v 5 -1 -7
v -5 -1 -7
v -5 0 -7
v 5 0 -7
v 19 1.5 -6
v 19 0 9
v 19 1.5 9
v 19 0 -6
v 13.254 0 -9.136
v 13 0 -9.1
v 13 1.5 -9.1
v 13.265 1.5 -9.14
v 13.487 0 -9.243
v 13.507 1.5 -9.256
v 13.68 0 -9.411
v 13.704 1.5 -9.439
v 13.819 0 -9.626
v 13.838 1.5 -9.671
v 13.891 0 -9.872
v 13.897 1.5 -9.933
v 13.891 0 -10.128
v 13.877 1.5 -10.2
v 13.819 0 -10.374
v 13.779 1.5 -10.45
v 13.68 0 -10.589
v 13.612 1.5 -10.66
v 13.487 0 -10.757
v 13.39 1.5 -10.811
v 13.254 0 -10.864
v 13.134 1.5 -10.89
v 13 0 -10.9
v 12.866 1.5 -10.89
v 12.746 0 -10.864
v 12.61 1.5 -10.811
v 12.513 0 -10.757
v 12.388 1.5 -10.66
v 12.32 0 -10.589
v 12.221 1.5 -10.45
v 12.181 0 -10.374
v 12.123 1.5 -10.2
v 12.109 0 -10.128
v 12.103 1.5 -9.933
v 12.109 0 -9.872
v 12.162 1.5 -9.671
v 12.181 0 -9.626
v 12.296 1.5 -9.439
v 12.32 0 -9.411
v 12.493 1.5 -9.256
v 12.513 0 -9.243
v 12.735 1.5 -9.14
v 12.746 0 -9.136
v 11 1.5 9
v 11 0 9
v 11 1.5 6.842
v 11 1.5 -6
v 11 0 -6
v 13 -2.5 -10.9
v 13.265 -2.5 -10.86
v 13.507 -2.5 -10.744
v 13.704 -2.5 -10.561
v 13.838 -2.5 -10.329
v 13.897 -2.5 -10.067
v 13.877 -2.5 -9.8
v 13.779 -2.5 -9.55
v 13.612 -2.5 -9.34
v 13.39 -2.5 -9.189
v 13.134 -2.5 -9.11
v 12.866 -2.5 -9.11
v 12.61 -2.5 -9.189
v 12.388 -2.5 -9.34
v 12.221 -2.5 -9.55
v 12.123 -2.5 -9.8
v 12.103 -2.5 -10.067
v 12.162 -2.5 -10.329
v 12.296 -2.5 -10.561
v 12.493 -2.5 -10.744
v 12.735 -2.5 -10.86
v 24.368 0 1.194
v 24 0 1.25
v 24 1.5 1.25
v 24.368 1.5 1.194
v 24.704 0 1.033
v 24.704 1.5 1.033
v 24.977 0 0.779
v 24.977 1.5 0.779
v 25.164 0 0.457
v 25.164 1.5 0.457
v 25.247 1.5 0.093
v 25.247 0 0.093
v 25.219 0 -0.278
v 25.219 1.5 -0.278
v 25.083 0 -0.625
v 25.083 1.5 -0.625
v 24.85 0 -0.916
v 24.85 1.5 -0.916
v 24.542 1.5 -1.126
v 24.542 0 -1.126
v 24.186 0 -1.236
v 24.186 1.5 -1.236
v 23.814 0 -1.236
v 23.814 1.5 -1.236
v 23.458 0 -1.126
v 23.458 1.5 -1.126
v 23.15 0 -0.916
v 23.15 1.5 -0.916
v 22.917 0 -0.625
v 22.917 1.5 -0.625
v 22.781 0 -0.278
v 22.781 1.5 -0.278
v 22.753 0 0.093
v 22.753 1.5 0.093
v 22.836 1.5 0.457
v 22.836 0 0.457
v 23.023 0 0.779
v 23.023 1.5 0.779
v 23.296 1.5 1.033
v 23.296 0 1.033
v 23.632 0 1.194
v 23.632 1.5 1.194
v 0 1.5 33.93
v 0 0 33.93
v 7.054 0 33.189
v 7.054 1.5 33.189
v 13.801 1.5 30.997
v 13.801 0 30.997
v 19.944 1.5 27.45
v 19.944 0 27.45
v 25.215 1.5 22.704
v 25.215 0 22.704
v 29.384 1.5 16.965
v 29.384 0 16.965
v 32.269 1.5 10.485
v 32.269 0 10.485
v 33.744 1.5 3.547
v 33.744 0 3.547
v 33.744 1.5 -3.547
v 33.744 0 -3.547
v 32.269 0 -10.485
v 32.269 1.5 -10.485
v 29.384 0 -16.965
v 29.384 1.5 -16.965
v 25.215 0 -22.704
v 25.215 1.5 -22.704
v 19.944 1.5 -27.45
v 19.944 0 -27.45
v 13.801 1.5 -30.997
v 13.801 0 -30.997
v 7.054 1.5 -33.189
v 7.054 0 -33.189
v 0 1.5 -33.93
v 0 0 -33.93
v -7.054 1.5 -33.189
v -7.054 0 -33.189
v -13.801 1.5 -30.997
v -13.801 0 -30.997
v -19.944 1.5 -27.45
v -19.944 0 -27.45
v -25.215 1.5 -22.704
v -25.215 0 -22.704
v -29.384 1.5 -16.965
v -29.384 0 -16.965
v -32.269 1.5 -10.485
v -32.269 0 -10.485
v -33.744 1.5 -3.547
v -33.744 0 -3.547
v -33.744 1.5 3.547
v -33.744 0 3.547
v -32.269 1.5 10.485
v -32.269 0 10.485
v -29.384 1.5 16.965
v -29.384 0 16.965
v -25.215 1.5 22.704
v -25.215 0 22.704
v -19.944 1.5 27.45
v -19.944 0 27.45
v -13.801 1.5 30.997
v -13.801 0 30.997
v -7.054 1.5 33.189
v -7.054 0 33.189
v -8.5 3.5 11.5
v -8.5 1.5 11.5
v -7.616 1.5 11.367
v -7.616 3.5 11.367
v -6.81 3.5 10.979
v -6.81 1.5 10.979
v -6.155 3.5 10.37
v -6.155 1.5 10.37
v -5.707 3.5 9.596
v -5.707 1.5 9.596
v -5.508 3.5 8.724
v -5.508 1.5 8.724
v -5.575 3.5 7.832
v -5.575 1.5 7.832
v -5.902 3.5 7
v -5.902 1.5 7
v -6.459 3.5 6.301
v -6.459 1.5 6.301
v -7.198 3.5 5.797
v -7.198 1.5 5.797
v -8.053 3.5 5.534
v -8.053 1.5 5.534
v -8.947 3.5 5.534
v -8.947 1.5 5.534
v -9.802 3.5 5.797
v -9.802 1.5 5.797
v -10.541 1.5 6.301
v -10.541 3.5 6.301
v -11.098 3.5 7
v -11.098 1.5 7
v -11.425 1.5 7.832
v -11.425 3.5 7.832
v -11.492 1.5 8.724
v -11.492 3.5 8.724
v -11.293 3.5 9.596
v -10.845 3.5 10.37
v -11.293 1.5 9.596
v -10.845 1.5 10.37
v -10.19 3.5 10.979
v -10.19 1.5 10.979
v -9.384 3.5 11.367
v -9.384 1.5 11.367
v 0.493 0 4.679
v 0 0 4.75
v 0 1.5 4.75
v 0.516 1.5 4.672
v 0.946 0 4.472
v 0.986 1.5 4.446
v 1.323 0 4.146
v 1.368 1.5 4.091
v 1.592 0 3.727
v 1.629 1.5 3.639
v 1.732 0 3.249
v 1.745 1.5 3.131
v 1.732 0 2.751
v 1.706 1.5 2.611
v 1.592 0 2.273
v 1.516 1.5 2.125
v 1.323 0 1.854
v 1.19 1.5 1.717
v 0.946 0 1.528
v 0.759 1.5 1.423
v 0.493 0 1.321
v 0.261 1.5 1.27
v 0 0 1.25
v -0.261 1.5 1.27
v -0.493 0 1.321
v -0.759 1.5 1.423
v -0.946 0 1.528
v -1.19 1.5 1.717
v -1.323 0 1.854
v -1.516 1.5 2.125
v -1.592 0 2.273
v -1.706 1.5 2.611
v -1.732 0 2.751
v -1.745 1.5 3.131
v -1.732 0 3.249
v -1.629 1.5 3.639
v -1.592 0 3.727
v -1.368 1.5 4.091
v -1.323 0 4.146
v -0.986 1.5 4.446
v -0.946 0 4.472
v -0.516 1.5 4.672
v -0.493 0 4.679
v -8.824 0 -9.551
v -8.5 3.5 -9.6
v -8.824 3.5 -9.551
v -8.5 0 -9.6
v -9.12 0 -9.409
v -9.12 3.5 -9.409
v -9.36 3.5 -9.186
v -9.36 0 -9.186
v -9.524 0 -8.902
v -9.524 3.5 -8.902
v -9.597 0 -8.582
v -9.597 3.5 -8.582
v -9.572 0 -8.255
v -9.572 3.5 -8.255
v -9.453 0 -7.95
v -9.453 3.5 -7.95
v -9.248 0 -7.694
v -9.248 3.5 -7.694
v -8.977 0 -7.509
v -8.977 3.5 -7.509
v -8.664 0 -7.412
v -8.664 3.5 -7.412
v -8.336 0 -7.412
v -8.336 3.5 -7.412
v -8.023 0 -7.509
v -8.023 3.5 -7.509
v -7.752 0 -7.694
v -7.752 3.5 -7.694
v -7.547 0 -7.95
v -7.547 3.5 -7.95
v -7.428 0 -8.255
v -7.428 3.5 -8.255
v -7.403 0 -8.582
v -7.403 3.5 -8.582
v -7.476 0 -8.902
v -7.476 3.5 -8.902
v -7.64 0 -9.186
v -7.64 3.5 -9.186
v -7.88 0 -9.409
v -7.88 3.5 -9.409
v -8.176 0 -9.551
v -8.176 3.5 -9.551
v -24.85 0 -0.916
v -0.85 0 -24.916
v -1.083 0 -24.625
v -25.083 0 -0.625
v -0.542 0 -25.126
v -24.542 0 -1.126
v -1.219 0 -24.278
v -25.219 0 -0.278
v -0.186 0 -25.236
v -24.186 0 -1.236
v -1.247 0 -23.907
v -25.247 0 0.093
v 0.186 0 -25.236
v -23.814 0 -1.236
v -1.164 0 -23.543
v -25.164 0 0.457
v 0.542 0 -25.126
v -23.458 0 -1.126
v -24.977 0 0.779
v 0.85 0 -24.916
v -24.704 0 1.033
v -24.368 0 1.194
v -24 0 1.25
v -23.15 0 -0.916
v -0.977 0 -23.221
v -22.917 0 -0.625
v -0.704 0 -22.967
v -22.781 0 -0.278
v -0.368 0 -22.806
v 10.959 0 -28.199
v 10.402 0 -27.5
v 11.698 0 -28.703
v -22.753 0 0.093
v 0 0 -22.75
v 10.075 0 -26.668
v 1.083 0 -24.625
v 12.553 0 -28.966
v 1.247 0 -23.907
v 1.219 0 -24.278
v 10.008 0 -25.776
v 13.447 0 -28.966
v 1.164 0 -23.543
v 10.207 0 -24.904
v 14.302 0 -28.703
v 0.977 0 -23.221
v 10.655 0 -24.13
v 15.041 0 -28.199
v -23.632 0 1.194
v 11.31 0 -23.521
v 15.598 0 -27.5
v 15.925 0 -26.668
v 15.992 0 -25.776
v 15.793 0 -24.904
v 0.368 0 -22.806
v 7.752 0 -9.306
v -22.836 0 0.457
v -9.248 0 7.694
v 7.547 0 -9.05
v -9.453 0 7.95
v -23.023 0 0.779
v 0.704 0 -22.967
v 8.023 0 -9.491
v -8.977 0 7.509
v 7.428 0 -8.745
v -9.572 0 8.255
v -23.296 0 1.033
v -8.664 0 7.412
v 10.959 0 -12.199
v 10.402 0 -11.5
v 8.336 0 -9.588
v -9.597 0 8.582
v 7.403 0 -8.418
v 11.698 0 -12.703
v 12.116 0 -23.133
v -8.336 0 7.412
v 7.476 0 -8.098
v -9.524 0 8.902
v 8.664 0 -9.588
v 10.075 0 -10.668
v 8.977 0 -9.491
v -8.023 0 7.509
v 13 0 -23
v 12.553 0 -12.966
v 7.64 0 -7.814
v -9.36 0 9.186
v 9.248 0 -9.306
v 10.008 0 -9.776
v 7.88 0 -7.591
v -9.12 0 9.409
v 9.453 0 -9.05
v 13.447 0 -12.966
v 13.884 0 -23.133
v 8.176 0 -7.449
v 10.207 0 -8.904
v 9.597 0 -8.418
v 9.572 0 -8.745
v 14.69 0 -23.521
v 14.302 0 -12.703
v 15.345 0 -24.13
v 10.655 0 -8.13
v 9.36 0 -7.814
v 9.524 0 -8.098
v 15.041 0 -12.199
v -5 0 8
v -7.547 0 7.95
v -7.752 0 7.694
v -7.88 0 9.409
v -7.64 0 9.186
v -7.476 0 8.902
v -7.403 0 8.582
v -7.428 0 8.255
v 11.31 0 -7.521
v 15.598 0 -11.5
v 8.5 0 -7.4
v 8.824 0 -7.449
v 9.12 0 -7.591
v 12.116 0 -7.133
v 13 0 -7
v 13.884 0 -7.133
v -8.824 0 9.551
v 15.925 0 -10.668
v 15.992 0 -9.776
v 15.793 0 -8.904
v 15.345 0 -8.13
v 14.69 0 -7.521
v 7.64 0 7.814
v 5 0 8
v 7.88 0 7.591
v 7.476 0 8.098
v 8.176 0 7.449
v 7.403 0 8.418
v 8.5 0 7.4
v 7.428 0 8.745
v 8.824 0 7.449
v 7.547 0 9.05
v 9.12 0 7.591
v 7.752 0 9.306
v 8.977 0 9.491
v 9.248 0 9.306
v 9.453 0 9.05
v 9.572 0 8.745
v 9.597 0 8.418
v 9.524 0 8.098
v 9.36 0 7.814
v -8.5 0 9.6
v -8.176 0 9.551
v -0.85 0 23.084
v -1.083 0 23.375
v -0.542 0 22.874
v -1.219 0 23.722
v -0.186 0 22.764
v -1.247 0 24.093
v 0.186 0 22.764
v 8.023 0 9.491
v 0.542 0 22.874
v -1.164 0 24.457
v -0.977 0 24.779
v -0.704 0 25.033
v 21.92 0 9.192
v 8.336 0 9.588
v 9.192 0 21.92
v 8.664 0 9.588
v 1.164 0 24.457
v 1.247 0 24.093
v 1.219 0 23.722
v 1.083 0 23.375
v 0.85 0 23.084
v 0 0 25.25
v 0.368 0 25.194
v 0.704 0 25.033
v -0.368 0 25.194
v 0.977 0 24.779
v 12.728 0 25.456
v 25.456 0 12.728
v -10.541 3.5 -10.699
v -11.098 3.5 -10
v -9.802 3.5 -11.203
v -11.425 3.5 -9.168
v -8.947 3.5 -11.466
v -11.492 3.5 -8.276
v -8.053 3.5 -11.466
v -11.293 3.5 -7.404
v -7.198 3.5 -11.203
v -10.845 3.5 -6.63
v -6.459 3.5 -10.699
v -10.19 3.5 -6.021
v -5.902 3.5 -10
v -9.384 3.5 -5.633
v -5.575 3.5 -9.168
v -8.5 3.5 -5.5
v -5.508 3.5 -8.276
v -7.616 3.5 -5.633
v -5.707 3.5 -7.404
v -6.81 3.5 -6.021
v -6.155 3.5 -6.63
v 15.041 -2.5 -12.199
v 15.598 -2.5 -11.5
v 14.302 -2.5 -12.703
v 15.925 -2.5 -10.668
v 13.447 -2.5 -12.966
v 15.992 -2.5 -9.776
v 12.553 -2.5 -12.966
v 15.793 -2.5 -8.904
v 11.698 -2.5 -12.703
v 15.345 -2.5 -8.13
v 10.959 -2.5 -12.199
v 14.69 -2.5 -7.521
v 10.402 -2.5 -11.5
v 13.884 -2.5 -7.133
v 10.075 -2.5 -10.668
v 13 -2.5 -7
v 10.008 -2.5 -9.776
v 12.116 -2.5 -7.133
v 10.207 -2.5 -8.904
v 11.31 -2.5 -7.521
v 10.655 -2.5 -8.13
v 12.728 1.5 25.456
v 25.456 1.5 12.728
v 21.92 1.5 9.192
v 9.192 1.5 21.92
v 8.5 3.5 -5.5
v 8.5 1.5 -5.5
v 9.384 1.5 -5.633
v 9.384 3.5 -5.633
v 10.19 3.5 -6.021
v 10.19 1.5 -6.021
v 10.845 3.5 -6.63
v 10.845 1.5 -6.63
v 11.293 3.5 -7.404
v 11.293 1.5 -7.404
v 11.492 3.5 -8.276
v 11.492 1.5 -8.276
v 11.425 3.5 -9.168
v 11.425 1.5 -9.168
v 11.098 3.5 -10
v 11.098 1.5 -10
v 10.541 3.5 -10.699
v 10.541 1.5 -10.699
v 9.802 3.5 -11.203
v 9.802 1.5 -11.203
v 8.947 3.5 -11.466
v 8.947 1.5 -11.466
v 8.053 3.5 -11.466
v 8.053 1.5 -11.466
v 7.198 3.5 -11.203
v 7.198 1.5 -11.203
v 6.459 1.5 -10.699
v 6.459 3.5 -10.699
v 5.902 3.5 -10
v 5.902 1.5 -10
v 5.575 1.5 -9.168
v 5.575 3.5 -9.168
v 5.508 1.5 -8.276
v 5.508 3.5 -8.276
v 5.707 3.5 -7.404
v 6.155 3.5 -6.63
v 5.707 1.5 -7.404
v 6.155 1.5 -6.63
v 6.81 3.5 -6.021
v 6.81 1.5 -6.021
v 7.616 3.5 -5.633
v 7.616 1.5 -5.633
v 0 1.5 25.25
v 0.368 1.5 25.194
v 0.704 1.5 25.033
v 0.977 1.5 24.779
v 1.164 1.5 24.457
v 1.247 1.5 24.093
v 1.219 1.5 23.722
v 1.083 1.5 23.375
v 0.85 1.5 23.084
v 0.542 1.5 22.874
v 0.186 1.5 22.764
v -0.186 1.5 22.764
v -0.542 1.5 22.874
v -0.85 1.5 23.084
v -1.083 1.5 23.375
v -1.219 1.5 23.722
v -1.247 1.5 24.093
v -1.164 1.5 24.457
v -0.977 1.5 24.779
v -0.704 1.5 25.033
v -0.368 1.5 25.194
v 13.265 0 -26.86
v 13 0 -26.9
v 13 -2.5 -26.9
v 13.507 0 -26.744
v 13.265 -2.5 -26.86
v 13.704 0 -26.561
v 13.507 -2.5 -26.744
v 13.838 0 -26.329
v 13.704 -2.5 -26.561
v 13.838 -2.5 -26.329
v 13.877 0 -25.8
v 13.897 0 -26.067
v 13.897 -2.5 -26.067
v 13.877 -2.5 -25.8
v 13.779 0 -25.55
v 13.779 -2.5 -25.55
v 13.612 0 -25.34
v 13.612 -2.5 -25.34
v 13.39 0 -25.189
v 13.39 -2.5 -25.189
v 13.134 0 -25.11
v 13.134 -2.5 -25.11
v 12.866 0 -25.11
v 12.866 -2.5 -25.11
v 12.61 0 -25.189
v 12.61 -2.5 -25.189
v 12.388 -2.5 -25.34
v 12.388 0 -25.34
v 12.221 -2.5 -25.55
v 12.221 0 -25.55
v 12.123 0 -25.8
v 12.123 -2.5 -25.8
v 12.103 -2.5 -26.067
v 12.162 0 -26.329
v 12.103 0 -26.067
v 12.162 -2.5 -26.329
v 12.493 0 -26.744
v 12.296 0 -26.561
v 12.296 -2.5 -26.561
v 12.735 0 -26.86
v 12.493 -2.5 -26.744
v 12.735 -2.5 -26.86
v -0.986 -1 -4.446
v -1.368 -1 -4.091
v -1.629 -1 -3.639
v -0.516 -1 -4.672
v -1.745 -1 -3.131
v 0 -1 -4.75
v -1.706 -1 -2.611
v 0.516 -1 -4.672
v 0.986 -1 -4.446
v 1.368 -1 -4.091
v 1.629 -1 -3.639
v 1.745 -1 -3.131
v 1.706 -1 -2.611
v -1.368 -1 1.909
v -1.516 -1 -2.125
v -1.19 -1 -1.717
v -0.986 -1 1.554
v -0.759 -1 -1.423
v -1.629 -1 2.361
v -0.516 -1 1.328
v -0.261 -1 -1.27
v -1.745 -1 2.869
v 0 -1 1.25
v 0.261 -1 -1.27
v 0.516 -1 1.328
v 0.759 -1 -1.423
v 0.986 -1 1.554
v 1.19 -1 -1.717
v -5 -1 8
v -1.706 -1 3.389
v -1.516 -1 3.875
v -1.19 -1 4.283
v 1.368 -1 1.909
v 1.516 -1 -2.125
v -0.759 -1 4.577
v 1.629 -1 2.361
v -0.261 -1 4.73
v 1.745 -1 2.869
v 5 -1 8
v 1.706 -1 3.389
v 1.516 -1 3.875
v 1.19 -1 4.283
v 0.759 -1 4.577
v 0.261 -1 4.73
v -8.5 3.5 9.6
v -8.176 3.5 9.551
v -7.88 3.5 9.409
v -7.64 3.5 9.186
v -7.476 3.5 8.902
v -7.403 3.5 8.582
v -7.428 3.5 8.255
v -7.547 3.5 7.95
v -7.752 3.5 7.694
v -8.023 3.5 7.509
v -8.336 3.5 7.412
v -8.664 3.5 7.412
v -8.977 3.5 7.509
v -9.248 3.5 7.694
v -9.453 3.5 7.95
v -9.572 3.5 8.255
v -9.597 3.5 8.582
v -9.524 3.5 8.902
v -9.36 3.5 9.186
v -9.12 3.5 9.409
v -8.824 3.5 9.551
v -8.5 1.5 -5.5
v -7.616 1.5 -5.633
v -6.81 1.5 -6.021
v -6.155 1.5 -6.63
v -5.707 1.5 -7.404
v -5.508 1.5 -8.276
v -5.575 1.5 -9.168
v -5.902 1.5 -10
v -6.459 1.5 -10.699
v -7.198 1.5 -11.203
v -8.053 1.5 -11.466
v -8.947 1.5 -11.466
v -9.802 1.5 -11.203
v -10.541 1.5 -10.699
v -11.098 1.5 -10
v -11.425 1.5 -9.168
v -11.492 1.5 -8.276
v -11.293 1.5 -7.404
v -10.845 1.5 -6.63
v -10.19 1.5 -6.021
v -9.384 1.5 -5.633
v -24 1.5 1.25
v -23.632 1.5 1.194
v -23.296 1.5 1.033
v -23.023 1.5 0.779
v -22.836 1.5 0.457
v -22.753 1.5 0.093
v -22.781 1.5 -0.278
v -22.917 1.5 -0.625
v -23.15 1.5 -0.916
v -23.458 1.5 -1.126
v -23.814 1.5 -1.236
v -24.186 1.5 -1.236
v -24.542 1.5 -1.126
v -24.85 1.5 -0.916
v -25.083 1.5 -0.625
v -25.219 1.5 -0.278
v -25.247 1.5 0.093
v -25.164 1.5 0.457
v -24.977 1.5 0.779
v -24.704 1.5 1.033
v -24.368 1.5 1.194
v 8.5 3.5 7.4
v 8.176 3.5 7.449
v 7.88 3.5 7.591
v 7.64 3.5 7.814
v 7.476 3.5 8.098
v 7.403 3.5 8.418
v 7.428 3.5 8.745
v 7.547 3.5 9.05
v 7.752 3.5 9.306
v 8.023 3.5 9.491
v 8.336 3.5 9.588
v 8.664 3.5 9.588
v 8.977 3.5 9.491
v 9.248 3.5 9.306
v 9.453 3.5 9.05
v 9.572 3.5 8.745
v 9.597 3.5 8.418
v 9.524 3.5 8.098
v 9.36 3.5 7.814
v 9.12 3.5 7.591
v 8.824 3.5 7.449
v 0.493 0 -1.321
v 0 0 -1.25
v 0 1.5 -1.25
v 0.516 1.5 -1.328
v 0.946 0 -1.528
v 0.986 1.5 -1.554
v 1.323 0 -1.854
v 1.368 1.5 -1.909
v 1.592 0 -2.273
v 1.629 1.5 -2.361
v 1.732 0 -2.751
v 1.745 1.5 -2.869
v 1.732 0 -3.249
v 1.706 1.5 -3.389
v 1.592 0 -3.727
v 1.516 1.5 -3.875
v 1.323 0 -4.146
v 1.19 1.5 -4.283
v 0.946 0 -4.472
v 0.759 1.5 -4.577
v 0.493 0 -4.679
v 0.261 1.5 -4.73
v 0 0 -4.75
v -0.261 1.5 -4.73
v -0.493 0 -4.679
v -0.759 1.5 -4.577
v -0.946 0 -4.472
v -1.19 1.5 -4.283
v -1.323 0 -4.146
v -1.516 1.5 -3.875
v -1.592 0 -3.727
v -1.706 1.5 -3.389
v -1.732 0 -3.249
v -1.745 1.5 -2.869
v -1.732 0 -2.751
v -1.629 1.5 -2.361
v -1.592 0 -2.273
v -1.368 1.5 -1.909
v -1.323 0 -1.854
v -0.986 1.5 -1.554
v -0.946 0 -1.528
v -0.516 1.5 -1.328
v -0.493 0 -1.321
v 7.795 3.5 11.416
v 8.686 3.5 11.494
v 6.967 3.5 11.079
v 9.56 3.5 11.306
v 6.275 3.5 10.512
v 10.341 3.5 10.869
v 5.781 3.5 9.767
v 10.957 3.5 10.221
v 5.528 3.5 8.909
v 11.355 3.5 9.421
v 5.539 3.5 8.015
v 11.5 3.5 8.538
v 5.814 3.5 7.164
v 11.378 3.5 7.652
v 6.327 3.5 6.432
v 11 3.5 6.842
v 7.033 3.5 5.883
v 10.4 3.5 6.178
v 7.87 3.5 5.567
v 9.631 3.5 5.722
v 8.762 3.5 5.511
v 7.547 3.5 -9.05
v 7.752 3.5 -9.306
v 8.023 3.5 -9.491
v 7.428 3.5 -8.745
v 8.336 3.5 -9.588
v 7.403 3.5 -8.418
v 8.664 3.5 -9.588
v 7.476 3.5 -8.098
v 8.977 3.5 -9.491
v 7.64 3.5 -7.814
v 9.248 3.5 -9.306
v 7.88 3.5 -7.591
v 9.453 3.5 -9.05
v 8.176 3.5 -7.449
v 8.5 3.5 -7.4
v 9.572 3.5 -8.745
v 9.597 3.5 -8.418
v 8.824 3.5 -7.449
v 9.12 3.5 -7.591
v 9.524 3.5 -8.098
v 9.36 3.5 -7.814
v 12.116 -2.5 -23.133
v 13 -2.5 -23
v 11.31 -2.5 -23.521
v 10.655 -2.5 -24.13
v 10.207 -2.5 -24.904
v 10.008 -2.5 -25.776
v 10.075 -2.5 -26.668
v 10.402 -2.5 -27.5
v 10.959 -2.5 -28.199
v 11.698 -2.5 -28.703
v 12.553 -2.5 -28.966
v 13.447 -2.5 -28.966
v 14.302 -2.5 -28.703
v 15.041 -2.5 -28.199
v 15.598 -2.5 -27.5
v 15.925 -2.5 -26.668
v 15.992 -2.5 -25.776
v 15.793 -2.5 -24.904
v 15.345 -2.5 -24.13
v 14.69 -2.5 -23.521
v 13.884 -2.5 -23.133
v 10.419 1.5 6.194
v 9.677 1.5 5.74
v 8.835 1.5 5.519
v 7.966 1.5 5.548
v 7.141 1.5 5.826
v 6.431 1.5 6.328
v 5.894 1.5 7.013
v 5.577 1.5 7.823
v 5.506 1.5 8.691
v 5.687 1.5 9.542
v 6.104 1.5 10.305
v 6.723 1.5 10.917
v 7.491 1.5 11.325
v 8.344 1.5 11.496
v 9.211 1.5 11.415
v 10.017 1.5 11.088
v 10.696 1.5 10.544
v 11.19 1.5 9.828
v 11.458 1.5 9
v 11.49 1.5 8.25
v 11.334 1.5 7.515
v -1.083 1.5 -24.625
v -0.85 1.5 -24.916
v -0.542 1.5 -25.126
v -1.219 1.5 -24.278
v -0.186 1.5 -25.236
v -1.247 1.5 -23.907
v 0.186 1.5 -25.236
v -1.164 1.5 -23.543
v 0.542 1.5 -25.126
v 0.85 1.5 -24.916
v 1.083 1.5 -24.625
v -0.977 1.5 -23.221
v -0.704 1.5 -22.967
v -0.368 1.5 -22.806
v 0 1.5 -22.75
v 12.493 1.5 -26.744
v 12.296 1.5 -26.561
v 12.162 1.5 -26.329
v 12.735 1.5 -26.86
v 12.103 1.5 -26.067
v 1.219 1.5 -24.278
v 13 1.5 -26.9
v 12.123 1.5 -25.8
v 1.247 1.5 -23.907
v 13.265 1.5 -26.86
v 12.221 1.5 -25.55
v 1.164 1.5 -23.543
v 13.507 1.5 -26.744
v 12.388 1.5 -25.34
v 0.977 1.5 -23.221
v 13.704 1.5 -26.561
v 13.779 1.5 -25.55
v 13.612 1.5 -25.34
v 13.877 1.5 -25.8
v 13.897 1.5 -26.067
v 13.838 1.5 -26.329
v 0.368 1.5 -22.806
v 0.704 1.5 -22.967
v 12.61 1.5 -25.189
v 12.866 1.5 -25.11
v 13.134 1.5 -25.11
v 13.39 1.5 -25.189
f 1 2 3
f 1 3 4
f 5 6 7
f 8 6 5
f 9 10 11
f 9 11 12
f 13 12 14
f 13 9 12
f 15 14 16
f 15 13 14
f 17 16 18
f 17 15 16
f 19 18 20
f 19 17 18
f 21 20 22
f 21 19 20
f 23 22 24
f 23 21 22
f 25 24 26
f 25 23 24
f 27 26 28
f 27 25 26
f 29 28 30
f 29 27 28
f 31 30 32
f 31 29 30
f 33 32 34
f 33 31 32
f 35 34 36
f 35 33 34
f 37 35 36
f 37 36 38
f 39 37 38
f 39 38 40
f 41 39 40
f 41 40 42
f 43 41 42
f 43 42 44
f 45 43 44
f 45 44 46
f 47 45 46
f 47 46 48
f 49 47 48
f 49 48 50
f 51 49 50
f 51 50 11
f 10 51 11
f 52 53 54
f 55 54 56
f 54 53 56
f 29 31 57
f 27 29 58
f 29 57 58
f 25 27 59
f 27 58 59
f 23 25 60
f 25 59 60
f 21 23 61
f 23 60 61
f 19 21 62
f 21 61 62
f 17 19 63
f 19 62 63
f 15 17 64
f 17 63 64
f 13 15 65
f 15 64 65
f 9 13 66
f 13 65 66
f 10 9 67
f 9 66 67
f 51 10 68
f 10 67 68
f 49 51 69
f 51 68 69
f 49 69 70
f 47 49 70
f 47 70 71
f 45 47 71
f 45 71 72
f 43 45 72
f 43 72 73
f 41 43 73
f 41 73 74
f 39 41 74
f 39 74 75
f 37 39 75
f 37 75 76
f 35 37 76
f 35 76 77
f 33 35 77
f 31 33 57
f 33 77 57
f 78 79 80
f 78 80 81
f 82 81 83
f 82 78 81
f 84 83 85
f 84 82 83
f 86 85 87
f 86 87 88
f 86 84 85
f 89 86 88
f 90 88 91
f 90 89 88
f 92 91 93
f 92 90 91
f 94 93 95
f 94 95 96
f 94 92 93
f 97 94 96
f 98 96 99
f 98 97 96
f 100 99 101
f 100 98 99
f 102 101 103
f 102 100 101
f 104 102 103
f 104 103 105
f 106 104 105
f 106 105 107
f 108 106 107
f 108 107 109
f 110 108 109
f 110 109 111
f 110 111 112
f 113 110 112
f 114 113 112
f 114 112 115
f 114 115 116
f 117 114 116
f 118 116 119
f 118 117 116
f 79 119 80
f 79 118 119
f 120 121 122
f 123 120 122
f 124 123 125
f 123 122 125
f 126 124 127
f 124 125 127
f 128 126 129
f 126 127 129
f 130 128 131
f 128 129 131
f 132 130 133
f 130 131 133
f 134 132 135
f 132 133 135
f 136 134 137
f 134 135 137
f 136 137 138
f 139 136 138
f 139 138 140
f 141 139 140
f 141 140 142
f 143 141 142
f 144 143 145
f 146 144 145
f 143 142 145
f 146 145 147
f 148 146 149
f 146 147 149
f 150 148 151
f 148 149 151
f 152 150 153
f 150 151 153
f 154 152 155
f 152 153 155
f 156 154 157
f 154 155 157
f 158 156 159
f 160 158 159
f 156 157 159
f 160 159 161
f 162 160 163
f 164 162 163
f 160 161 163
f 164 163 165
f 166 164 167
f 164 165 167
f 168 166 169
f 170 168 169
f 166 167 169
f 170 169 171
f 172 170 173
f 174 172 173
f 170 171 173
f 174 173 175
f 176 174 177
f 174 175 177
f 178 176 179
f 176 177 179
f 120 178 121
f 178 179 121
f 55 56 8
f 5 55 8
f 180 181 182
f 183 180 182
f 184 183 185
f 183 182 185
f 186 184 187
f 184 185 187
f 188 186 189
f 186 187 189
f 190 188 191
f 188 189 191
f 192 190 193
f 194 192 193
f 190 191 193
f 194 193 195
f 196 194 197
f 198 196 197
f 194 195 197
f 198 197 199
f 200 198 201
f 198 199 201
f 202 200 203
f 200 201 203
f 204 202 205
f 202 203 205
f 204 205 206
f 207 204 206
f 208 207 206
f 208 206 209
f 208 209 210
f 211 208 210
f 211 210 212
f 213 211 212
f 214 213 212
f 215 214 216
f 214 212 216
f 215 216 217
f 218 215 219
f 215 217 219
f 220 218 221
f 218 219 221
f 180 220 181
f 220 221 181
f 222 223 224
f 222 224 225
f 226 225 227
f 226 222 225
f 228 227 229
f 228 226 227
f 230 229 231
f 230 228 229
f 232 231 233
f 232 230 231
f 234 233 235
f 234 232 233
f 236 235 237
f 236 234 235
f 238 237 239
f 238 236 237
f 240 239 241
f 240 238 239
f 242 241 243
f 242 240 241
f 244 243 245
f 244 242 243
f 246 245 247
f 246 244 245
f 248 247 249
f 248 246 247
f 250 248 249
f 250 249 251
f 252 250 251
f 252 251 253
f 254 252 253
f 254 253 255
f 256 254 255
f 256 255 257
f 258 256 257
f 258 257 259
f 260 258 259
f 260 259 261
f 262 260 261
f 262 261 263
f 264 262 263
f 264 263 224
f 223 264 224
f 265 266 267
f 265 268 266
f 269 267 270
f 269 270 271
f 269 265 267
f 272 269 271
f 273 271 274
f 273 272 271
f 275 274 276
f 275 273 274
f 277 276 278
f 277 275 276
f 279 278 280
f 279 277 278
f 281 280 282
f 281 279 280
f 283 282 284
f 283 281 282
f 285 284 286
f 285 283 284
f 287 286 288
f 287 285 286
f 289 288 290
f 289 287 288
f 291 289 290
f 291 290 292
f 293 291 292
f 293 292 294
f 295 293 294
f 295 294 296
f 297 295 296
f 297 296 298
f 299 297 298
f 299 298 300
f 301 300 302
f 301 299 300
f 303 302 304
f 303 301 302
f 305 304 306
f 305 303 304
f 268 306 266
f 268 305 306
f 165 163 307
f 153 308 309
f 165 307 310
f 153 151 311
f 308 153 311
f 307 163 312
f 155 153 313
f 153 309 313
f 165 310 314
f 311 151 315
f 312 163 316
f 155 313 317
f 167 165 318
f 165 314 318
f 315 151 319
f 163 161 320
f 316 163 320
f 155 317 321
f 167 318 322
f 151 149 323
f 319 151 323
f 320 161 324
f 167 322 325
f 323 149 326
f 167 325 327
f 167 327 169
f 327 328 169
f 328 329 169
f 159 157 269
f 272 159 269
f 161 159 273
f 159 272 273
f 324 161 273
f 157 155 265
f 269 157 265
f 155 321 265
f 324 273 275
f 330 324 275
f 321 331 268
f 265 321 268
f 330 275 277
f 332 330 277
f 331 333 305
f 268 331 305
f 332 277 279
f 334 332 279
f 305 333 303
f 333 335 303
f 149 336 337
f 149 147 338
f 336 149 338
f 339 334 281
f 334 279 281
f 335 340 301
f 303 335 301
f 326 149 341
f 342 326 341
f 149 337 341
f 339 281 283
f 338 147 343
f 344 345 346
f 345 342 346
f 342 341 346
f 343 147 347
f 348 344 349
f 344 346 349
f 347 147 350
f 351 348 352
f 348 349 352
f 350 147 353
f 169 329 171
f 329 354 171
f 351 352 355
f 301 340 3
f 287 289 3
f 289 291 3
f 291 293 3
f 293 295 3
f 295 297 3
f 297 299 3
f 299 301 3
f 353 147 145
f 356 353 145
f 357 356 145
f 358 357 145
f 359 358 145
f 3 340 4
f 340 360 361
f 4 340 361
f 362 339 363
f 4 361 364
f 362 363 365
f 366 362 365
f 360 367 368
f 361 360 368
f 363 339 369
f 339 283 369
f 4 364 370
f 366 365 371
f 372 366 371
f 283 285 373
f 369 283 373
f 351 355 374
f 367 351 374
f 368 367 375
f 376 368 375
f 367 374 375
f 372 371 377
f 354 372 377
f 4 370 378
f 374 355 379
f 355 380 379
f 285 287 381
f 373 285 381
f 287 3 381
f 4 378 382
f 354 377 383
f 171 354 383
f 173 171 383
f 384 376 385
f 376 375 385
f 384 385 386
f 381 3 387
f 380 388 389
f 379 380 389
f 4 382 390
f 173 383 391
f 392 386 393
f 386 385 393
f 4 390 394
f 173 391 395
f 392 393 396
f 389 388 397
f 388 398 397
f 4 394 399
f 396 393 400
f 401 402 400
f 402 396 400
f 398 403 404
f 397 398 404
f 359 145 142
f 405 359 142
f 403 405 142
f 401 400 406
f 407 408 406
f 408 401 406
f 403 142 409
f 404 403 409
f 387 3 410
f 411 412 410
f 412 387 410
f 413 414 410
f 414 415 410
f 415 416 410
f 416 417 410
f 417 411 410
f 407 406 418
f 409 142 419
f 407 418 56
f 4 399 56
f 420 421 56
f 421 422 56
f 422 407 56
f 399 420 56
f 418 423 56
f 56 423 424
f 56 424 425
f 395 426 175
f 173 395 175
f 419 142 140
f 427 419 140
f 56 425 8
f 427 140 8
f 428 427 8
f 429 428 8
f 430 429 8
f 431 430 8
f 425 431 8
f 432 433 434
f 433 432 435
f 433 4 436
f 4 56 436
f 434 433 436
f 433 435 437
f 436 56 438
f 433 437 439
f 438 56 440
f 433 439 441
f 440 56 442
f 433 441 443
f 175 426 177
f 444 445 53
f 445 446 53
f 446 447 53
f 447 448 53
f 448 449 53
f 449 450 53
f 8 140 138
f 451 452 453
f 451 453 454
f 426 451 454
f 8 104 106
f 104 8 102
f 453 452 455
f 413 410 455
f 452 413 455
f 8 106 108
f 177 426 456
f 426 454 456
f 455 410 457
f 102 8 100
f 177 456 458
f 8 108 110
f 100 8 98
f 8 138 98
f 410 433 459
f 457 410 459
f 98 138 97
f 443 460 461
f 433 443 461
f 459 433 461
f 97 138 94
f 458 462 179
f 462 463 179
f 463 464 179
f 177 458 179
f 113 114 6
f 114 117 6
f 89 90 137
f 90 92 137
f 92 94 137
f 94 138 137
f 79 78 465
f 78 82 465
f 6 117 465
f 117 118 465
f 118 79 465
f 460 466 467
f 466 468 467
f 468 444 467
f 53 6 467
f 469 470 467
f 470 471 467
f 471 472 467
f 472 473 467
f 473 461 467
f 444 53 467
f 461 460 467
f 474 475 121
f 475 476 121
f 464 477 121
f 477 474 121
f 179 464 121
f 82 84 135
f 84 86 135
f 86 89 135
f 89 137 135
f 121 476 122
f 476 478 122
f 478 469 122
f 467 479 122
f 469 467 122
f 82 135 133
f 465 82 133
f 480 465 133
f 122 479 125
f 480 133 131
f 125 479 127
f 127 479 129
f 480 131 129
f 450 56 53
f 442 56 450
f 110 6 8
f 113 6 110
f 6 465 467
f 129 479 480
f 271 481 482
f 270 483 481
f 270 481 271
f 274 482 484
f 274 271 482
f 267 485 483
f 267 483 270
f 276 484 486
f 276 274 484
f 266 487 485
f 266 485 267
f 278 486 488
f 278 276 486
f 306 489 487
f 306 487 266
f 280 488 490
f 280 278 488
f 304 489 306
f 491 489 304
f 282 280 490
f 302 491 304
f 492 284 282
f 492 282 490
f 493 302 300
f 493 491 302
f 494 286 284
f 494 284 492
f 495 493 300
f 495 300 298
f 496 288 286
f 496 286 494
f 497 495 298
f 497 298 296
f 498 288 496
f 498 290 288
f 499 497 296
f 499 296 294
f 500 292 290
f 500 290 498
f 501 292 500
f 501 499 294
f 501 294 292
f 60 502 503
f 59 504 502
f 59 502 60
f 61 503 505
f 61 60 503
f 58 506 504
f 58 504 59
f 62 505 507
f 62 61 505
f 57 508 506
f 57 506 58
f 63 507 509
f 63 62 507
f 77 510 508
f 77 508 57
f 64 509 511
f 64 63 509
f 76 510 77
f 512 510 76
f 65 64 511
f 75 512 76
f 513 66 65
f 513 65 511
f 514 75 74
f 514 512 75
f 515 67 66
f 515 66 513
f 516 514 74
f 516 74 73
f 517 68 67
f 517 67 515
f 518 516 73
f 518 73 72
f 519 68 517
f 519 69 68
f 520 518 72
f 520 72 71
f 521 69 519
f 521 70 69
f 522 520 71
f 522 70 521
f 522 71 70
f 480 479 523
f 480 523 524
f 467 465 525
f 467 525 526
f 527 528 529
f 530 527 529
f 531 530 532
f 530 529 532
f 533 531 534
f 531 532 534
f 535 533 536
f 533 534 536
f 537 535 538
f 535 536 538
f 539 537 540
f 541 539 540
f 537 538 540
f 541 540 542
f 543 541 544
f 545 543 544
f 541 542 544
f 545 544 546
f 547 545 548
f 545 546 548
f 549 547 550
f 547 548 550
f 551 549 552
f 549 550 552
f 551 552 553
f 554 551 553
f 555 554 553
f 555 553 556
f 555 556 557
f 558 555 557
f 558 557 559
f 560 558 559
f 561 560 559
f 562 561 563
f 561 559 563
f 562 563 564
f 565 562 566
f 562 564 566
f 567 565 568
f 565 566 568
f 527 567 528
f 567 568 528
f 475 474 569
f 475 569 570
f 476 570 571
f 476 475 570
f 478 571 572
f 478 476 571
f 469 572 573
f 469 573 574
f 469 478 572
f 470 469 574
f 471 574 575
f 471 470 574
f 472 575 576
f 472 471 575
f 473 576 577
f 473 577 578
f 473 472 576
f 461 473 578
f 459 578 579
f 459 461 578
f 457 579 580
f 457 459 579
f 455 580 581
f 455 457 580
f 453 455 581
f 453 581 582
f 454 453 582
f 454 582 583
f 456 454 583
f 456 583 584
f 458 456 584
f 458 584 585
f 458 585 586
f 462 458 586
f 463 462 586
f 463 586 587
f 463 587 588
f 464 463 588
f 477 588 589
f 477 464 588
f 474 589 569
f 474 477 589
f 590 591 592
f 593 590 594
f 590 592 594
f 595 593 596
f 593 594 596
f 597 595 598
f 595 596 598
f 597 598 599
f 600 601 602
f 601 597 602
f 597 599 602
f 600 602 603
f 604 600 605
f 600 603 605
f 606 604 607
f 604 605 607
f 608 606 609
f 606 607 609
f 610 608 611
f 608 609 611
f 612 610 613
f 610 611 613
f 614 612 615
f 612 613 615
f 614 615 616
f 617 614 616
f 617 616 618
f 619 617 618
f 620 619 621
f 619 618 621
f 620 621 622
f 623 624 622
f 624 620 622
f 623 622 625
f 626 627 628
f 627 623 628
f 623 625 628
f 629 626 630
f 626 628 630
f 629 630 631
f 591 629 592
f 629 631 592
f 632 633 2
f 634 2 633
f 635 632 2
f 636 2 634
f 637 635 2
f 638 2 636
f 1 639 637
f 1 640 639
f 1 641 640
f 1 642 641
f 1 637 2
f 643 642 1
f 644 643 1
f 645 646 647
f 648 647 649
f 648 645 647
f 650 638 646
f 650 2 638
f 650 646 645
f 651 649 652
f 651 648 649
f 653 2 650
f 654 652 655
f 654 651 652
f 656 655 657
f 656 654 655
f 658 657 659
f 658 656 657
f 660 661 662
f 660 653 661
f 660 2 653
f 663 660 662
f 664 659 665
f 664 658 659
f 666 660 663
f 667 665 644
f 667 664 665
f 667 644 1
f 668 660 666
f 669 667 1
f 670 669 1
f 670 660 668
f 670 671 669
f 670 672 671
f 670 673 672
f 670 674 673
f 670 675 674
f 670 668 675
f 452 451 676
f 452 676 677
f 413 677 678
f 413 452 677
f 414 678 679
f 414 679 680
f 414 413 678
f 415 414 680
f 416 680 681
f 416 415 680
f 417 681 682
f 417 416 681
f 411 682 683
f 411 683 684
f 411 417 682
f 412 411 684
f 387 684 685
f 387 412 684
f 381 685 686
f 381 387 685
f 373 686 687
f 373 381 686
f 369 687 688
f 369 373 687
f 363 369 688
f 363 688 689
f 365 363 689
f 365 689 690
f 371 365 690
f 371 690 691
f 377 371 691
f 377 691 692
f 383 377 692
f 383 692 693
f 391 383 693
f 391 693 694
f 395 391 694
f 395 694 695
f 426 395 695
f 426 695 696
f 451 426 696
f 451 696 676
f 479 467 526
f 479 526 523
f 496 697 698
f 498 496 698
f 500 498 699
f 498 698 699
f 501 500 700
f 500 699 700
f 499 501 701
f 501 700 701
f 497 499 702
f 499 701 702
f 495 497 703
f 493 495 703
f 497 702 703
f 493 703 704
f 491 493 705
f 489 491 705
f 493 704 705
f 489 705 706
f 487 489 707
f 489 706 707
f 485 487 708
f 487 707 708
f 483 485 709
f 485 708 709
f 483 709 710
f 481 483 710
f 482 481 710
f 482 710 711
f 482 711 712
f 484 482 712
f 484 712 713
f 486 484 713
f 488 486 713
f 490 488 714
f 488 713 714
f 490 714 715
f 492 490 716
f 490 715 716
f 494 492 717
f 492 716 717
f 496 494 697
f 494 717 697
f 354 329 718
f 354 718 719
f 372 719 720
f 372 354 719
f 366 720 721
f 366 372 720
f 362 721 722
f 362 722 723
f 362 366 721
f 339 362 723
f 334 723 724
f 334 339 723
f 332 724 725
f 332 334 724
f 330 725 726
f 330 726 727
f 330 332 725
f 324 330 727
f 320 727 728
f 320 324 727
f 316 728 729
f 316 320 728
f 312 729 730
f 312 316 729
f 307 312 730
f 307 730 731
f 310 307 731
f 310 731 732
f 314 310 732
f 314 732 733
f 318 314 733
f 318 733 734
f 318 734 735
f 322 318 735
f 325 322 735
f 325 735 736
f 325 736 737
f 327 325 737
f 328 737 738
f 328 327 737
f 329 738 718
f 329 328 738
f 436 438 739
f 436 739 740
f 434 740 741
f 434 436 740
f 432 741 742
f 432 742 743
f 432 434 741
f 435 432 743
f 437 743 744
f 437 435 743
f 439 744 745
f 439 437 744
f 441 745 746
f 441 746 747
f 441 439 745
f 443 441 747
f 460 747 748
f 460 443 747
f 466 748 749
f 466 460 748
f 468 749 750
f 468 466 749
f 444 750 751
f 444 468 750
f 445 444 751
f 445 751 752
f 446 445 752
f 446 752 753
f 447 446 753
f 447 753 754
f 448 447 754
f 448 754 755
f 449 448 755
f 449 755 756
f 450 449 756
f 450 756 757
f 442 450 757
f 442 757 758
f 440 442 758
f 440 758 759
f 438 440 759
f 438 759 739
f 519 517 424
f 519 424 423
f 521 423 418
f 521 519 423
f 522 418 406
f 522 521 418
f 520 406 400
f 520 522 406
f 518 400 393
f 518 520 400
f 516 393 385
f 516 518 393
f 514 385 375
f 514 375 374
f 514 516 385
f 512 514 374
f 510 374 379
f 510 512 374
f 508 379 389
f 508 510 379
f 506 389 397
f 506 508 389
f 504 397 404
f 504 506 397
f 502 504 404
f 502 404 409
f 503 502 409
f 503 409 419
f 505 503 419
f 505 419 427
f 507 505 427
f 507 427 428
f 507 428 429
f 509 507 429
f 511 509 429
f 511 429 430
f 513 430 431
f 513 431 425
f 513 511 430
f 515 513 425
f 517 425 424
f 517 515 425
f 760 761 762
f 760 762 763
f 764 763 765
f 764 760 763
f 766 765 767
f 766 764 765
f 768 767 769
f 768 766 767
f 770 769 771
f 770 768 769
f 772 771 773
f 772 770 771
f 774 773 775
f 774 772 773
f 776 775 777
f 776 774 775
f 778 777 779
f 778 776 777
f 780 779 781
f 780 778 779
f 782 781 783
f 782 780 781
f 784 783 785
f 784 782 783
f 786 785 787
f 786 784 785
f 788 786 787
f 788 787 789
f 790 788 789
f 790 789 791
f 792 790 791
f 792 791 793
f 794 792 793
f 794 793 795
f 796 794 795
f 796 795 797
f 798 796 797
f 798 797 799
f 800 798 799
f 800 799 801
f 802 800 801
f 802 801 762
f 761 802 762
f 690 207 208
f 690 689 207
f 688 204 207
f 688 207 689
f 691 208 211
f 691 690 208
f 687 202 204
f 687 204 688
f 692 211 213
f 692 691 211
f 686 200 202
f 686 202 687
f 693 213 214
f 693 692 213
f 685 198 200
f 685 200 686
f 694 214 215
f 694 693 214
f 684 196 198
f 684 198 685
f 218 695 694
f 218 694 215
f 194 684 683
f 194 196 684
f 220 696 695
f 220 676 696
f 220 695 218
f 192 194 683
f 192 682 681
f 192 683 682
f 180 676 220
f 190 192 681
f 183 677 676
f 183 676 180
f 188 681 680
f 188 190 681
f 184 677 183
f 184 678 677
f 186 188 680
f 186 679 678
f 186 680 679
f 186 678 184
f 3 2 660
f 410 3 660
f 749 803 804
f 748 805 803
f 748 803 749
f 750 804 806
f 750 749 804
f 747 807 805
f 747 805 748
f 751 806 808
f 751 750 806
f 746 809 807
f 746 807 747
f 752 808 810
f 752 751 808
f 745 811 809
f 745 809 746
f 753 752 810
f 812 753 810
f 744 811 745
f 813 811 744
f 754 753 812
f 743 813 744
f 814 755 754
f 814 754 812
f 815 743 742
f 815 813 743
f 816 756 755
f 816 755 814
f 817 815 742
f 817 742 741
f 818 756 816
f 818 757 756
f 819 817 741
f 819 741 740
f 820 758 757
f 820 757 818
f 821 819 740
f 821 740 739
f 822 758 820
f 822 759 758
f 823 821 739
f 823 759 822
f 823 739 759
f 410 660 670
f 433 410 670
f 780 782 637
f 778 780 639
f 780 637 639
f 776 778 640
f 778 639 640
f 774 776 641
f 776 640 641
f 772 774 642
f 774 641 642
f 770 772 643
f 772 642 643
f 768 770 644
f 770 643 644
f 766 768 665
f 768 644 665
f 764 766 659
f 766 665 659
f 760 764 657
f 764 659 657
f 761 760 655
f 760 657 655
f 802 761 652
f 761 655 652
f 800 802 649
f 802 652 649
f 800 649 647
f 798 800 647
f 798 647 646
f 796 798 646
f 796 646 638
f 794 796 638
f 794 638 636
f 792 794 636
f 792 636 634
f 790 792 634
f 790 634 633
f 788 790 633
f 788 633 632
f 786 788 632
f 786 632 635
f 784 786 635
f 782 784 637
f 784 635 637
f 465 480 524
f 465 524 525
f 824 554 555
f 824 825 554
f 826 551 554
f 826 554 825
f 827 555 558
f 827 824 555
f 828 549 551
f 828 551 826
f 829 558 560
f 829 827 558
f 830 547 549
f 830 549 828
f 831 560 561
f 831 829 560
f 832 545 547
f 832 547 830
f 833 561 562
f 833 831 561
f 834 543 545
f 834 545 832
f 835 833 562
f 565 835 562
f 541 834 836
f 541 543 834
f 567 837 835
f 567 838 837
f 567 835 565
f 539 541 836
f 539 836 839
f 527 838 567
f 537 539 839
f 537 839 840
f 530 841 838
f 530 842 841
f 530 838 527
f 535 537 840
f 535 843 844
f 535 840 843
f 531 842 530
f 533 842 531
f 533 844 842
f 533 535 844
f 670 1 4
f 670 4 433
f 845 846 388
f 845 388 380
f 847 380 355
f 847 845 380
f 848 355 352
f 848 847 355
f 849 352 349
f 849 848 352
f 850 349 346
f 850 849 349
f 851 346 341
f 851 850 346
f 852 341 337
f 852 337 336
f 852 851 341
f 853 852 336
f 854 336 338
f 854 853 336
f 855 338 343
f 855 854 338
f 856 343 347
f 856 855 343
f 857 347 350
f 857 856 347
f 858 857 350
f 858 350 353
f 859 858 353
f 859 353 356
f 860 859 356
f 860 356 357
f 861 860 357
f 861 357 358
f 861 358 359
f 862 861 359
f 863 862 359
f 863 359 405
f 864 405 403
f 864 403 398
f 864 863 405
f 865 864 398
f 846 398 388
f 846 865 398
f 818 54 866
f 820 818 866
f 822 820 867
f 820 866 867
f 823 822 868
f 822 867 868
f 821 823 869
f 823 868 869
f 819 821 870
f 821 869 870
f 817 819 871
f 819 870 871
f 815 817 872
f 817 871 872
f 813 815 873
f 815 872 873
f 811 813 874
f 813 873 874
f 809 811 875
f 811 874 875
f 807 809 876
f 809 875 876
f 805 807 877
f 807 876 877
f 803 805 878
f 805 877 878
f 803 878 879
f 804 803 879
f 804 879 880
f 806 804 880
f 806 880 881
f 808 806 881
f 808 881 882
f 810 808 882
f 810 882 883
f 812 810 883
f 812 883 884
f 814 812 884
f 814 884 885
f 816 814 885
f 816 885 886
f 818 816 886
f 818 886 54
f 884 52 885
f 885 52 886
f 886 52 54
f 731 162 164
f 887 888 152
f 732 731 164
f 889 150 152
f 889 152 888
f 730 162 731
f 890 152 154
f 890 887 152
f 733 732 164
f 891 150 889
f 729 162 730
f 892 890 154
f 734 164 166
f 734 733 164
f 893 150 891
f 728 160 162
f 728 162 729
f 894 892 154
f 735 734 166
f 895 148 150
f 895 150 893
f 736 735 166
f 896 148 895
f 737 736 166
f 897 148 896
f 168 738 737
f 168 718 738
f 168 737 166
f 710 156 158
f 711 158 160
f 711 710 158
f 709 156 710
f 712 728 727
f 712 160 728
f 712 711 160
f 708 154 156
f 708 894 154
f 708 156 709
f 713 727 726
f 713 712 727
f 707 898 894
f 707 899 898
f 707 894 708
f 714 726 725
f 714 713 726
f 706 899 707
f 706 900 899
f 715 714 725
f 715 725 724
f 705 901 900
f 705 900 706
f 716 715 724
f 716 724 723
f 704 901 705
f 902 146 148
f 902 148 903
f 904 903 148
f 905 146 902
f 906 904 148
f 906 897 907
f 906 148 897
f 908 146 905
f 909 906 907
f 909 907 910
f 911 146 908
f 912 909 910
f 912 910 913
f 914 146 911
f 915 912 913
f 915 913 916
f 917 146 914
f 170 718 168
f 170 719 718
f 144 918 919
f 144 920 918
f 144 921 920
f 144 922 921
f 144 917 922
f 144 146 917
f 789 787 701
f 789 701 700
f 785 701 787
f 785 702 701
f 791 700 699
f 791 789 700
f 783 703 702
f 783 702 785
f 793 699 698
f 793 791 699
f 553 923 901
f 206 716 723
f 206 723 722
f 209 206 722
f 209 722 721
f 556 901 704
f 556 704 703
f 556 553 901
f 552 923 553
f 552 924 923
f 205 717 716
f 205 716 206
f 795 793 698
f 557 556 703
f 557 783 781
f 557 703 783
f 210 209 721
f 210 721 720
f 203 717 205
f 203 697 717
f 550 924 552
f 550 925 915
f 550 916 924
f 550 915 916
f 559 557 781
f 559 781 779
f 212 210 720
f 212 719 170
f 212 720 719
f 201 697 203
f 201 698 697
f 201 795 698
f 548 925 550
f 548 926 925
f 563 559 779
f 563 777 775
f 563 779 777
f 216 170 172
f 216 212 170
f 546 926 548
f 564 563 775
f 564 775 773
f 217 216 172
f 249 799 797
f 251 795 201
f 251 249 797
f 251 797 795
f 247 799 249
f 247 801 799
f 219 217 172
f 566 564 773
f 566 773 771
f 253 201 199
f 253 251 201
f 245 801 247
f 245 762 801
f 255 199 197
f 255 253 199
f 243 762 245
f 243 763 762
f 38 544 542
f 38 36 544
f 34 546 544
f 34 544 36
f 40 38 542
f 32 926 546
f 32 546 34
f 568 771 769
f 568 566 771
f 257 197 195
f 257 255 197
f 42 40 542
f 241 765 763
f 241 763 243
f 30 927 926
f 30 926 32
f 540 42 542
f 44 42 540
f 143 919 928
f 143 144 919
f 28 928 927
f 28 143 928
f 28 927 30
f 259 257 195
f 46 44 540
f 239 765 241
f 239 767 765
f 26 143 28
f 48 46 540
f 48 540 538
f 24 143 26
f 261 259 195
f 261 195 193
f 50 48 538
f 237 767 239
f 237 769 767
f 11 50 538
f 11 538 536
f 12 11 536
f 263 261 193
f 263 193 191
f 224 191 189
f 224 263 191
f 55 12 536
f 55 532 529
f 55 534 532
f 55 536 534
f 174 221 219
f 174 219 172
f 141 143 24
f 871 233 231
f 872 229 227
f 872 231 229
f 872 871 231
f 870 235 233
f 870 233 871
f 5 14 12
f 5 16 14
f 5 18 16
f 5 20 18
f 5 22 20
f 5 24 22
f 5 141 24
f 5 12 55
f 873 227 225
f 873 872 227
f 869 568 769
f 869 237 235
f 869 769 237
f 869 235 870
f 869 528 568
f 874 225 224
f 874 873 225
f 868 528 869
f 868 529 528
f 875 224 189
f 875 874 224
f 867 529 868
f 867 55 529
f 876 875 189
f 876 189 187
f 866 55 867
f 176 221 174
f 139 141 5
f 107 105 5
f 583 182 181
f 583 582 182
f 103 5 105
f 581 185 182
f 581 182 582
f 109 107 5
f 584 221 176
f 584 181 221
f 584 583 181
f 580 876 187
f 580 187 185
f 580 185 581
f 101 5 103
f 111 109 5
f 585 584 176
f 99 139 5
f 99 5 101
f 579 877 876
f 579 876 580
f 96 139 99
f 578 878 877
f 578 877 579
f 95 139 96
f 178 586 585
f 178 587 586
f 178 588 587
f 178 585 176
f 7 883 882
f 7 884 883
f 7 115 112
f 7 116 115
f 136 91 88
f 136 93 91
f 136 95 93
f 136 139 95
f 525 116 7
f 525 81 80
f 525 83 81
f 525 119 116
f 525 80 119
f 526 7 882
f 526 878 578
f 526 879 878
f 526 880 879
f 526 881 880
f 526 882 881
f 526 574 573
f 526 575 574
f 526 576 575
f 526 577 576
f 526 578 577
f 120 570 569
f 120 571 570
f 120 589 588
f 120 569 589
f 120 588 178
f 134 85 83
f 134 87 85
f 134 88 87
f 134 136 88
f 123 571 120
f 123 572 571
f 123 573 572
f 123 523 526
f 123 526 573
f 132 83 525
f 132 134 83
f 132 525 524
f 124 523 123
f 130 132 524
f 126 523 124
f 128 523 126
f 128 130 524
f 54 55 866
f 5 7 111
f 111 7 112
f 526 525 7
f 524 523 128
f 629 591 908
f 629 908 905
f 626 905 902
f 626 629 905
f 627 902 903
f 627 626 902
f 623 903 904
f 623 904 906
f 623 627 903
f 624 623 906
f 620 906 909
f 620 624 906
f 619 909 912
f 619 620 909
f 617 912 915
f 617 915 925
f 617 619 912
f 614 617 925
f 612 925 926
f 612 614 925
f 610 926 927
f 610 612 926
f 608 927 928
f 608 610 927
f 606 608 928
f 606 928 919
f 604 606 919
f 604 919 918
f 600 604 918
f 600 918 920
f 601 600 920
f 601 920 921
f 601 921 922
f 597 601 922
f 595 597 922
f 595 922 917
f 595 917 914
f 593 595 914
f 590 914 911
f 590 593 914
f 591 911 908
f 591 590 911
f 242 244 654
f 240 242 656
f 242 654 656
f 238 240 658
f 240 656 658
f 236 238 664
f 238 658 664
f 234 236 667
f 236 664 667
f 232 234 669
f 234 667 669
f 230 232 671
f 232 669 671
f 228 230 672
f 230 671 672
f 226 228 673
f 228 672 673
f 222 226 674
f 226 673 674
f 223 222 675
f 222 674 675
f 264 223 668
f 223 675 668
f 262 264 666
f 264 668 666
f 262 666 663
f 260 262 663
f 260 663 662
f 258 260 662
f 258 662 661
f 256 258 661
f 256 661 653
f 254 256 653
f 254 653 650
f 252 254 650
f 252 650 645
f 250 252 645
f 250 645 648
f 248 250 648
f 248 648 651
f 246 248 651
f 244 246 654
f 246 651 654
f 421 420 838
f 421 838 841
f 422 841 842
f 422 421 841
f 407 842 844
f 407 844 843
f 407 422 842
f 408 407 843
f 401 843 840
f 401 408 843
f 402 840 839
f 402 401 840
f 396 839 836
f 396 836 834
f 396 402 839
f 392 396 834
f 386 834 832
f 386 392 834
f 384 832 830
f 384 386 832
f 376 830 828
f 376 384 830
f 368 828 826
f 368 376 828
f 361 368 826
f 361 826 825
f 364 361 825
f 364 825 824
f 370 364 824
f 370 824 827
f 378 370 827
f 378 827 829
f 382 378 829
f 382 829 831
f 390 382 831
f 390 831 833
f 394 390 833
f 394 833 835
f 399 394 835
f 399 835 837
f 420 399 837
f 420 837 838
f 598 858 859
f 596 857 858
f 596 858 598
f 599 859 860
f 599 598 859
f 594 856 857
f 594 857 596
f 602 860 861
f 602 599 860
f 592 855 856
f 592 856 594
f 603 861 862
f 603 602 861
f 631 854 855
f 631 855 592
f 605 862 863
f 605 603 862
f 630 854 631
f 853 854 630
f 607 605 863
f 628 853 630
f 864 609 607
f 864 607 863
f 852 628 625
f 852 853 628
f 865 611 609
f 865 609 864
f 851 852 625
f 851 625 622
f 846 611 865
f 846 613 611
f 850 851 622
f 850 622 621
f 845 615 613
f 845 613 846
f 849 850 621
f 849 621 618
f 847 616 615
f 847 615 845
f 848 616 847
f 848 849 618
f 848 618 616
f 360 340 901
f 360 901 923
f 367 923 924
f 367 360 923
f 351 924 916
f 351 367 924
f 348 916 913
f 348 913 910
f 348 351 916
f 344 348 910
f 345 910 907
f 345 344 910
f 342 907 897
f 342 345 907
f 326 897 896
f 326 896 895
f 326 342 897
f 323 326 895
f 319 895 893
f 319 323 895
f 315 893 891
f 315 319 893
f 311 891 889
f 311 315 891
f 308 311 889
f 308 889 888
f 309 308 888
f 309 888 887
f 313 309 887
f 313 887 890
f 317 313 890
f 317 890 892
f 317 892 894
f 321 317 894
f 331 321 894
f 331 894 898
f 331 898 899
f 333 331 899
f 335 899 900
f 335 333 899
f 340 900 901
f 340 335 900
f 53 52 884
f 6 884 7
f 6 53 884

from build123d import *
from build123d.topology import SkipClean

# Parameters (mm, degrees)
SKETCH_1_R      = 33.929985128
SKETCH_1_R_2    = 1.25
SKETCH_1_R_3    = 1.1
SKETCH_1_R_4    = 1.75
SKETCH_1_R_5    = 0.9
SKETCH_1_W      = 8
SKETCH_1_H      = 15
EXTRUDE_1_DEPTH = 1.5
SKETCH_2_R      = 3
SKETCH_2_R_2    = 1.1
EXTRUDE_2_DEPTH = 2
EXTRUDE_START   = 1
SKETCH_3_W      = 10
SKETCH_3_H      = 15
SKETCH_3_R      = 1.75
EXTRUDE_3_DEPTH = 1
EXTRUDE_START_2 = 2.5
SKETCH_5_R      = 3
SKETCH_5_R_2    = 0.9
EXTRUDE_5_DEPTH = 2.5


with BuildPart() as part:
    # 草图1 → 凸台-拉伸1 (new body)
    with BuildSketch(Plane(origin=(0, 0, 0), x_dir=(1, 0, 0), z_dir=(0, 1, 0))):
        with Locations(Location((0, 0, 0), (0, 0, 270))):
            Circle(SKETCH_1_R)
        with Locations(Location((0, 24, 0), (0, 0, 270))):
            Circle(SKETCH_1_R_2, mode=Mode.SUBTRACT)
        with Locations(Location((24, 0, 0), (0, 0, 270))):
            Circle(SKETCH_1_R_2, mode=Mode.SUBTRACT)
        with Locations(Location((0, -24, 0), (0, 0, 270))):
            Circle(SKETCH_1_R_2, mode=Mode.SUBTRACT)
        with Locations(Location((-24, 0, 0), (0, 0, 270))):
            Circle(SKETCH_1_R_2, mode=Mode.SUBTRACT)
        with Locations(Location((8.5, 8.5, 0), (0, 0, 270))):
            Circle(SKETCH_1_R_3, mode=Mode.SUBTRACT)
        with Locations(Location((-8.5, 8.5, 0), (0, 0, 90))):
            Circle(SKETCH_1_R_3, mode=Mode.SUBTRACT)
        with Locations(Location((8.5, -8.5, 0), (0, 0, 90))):
            Circle(SKETCH_1_R_3, mode=Mode.SUBTRACT)
        with Locations(Location((-8.5, -8.5, 0), (0, 0, 270))):
            Circle(SKETCH_1_R_3, mode=Mode.SUBTRACT)
        with Locations(Location((0, 3, 0), (0, 0, 270))):
            Circle(SKETCH_1_R_4, mode=Mode.SUBTRACT)
        with Locations(Location((0, -3, 0), (0, 0, 270))):
            Circle(SKETCH_1_R_4, mode=Mode.SUBTRACT)
        with Locations(Location((13, 10, 0), (0, 0, 270))):
            Circle(SKETCH_1_R_5, mode=Mode.SUBTRACT)
        with Locations(Location((13, 26, 0), (0, 0, 90))):
            Circle(SKETCH_1_R_5, mode=Mode.SUBTRACT)
        Polygon((21.920310217, -9.192388155), (9.192388155, -21.920310217), (12.727922061, -25.455844123), (25.455844123, -12.727922061), align=None, mode=Mode.SUBTRACT)
        with Locations((15, -1.5)):
            Rectangle(SKETCH_1_W, SKETCH_1_H, mode=Mode.SUBTRACT)
    extrude(amount=EXTRUDE_1_DEPTH)

    # 草图2 → 凸台-拉伸2 (add)
    # profile 1 of 4: a face of its own
    with BuildSketch(Plane(origin=(0, 1.5, 0), x_dir=(1, 0, 0), z_dir=(0, 1, 0))):
        with Locations(Location((-8.5, 8.5, 0), (0, 0, 270))):
            Circle(SKETCH_2_R)
        with Locations(Location((-8.5, 8.5, 0), (0, 0, 90))):
            Circle(SKETCH_2_R_2, mode=Mode.SUBTRACT)
    # profile 2 of 4: a face of its own
    with BuildSketch(Plane(origin=(0, 1.5, 0), x_dir=(1, 0, 0), z_dir=(0, 1, 0))):
        with Locations(Location((8.5, 8.5, 0), (0, 0, 270))):
            Circle(SKETCH_2_R)
        with Locations(Location((8.5, 8.5, 0), (0, 0, 270))):
            Circle(SKETCH_2_R_2, mode=Mode.SUBTRACT)
    # profile 3 of 4: a face of its own
    with BuildSketch(Plane(origin=(0, 1.5, 0), x_dir=(1, 0, 0), z_dir=(0, 1, 0))):
        with Locations(Location((8.5, -8.5, 0), (0, 0, 33.557309762))):
            Circle(SKETCH_2_R)
        with Locations(Location((8.5, -8.5, 0), (0, 0, 90))):
            Circle(SKETCH_2_R_2, mode=Mode.SUBTRACT)
    # profile 4 of 4: a face of its own
    with BuildSketch(Plane(origin=(0, 1.5, 0), x_dir=(1, 0, 0), z_dir=(0, 1, 0))):
        with Locations(Location((-8.5, -8.5, 0), (0, 0, 270))):
            Circle(SKETCH_2_R)
        with Locations(Location((-8.5, -8.5, 0), (0, 0, 270))):
            Circle(SKETCH_2_R_2, mode=Mode.SUBTRACT)
    extrude(amount=EXTRUDE_2_DEPTH)

    # 草图3 → 凸台-拉伸3 (add)
    with SkipClean():  # the faces are left unmerged after this step: merging them gives an invalid solid
        with BuildSketch(Plane.XZ.offset(EXTRUDE_START)):
            with Locations((0, 0.5)):
                Rectangle(SKETCH_3_W, SKETCH_3_H)
            with Locations(Location((0, 3, 0), (0, 0, 270))):
                Circle(SKETCH_3_R, mode=Mode.SUBTRACT)
            with Locations(Location((0, -3, 0), (0, 0, 270))):
                Circle(SKETCH_3_R, mode=Mode.SUBTRACT)
        extrude(amount=-EXTRUDE_3_DEPTH)

    # 草图5 → 凸台-拉伸5 (add)
    # profile 1 of 2: a face of its own
    with SkipClean():  # the faces are left unmerged after this step: merging them gives an invalid solid
        with BuildSketch(Plane.XZ.offset(EXTRUDE_START_2)):
            with Locations(Location((13, -26, 0), (0, 0, 90))):
                Circle(SKETCH_5_R)
            with Locations(Location((13, -26, 0), (0, 0, 270))):
                Circle(SKETCH_5_R_2, mode=Mode.SUBTRACT)
        # profile 2 of 2: a face of its own
        with BuildSketch(Plane.XZ.offset(EXTRUDE_START_2)):
            with Locations(Location((13, -10, 0), (0, 0, 90))):
                Circle(SKETCH_5_R)
            with Locations(Location((13, -10, 0), (0, 0, 270))):
                Circle(SKETCH_5_R_2, mode=Mode.SUBTRACT)
        extrude(amount=-EXTRUDE_5_DEPTH)


solid = part.part
